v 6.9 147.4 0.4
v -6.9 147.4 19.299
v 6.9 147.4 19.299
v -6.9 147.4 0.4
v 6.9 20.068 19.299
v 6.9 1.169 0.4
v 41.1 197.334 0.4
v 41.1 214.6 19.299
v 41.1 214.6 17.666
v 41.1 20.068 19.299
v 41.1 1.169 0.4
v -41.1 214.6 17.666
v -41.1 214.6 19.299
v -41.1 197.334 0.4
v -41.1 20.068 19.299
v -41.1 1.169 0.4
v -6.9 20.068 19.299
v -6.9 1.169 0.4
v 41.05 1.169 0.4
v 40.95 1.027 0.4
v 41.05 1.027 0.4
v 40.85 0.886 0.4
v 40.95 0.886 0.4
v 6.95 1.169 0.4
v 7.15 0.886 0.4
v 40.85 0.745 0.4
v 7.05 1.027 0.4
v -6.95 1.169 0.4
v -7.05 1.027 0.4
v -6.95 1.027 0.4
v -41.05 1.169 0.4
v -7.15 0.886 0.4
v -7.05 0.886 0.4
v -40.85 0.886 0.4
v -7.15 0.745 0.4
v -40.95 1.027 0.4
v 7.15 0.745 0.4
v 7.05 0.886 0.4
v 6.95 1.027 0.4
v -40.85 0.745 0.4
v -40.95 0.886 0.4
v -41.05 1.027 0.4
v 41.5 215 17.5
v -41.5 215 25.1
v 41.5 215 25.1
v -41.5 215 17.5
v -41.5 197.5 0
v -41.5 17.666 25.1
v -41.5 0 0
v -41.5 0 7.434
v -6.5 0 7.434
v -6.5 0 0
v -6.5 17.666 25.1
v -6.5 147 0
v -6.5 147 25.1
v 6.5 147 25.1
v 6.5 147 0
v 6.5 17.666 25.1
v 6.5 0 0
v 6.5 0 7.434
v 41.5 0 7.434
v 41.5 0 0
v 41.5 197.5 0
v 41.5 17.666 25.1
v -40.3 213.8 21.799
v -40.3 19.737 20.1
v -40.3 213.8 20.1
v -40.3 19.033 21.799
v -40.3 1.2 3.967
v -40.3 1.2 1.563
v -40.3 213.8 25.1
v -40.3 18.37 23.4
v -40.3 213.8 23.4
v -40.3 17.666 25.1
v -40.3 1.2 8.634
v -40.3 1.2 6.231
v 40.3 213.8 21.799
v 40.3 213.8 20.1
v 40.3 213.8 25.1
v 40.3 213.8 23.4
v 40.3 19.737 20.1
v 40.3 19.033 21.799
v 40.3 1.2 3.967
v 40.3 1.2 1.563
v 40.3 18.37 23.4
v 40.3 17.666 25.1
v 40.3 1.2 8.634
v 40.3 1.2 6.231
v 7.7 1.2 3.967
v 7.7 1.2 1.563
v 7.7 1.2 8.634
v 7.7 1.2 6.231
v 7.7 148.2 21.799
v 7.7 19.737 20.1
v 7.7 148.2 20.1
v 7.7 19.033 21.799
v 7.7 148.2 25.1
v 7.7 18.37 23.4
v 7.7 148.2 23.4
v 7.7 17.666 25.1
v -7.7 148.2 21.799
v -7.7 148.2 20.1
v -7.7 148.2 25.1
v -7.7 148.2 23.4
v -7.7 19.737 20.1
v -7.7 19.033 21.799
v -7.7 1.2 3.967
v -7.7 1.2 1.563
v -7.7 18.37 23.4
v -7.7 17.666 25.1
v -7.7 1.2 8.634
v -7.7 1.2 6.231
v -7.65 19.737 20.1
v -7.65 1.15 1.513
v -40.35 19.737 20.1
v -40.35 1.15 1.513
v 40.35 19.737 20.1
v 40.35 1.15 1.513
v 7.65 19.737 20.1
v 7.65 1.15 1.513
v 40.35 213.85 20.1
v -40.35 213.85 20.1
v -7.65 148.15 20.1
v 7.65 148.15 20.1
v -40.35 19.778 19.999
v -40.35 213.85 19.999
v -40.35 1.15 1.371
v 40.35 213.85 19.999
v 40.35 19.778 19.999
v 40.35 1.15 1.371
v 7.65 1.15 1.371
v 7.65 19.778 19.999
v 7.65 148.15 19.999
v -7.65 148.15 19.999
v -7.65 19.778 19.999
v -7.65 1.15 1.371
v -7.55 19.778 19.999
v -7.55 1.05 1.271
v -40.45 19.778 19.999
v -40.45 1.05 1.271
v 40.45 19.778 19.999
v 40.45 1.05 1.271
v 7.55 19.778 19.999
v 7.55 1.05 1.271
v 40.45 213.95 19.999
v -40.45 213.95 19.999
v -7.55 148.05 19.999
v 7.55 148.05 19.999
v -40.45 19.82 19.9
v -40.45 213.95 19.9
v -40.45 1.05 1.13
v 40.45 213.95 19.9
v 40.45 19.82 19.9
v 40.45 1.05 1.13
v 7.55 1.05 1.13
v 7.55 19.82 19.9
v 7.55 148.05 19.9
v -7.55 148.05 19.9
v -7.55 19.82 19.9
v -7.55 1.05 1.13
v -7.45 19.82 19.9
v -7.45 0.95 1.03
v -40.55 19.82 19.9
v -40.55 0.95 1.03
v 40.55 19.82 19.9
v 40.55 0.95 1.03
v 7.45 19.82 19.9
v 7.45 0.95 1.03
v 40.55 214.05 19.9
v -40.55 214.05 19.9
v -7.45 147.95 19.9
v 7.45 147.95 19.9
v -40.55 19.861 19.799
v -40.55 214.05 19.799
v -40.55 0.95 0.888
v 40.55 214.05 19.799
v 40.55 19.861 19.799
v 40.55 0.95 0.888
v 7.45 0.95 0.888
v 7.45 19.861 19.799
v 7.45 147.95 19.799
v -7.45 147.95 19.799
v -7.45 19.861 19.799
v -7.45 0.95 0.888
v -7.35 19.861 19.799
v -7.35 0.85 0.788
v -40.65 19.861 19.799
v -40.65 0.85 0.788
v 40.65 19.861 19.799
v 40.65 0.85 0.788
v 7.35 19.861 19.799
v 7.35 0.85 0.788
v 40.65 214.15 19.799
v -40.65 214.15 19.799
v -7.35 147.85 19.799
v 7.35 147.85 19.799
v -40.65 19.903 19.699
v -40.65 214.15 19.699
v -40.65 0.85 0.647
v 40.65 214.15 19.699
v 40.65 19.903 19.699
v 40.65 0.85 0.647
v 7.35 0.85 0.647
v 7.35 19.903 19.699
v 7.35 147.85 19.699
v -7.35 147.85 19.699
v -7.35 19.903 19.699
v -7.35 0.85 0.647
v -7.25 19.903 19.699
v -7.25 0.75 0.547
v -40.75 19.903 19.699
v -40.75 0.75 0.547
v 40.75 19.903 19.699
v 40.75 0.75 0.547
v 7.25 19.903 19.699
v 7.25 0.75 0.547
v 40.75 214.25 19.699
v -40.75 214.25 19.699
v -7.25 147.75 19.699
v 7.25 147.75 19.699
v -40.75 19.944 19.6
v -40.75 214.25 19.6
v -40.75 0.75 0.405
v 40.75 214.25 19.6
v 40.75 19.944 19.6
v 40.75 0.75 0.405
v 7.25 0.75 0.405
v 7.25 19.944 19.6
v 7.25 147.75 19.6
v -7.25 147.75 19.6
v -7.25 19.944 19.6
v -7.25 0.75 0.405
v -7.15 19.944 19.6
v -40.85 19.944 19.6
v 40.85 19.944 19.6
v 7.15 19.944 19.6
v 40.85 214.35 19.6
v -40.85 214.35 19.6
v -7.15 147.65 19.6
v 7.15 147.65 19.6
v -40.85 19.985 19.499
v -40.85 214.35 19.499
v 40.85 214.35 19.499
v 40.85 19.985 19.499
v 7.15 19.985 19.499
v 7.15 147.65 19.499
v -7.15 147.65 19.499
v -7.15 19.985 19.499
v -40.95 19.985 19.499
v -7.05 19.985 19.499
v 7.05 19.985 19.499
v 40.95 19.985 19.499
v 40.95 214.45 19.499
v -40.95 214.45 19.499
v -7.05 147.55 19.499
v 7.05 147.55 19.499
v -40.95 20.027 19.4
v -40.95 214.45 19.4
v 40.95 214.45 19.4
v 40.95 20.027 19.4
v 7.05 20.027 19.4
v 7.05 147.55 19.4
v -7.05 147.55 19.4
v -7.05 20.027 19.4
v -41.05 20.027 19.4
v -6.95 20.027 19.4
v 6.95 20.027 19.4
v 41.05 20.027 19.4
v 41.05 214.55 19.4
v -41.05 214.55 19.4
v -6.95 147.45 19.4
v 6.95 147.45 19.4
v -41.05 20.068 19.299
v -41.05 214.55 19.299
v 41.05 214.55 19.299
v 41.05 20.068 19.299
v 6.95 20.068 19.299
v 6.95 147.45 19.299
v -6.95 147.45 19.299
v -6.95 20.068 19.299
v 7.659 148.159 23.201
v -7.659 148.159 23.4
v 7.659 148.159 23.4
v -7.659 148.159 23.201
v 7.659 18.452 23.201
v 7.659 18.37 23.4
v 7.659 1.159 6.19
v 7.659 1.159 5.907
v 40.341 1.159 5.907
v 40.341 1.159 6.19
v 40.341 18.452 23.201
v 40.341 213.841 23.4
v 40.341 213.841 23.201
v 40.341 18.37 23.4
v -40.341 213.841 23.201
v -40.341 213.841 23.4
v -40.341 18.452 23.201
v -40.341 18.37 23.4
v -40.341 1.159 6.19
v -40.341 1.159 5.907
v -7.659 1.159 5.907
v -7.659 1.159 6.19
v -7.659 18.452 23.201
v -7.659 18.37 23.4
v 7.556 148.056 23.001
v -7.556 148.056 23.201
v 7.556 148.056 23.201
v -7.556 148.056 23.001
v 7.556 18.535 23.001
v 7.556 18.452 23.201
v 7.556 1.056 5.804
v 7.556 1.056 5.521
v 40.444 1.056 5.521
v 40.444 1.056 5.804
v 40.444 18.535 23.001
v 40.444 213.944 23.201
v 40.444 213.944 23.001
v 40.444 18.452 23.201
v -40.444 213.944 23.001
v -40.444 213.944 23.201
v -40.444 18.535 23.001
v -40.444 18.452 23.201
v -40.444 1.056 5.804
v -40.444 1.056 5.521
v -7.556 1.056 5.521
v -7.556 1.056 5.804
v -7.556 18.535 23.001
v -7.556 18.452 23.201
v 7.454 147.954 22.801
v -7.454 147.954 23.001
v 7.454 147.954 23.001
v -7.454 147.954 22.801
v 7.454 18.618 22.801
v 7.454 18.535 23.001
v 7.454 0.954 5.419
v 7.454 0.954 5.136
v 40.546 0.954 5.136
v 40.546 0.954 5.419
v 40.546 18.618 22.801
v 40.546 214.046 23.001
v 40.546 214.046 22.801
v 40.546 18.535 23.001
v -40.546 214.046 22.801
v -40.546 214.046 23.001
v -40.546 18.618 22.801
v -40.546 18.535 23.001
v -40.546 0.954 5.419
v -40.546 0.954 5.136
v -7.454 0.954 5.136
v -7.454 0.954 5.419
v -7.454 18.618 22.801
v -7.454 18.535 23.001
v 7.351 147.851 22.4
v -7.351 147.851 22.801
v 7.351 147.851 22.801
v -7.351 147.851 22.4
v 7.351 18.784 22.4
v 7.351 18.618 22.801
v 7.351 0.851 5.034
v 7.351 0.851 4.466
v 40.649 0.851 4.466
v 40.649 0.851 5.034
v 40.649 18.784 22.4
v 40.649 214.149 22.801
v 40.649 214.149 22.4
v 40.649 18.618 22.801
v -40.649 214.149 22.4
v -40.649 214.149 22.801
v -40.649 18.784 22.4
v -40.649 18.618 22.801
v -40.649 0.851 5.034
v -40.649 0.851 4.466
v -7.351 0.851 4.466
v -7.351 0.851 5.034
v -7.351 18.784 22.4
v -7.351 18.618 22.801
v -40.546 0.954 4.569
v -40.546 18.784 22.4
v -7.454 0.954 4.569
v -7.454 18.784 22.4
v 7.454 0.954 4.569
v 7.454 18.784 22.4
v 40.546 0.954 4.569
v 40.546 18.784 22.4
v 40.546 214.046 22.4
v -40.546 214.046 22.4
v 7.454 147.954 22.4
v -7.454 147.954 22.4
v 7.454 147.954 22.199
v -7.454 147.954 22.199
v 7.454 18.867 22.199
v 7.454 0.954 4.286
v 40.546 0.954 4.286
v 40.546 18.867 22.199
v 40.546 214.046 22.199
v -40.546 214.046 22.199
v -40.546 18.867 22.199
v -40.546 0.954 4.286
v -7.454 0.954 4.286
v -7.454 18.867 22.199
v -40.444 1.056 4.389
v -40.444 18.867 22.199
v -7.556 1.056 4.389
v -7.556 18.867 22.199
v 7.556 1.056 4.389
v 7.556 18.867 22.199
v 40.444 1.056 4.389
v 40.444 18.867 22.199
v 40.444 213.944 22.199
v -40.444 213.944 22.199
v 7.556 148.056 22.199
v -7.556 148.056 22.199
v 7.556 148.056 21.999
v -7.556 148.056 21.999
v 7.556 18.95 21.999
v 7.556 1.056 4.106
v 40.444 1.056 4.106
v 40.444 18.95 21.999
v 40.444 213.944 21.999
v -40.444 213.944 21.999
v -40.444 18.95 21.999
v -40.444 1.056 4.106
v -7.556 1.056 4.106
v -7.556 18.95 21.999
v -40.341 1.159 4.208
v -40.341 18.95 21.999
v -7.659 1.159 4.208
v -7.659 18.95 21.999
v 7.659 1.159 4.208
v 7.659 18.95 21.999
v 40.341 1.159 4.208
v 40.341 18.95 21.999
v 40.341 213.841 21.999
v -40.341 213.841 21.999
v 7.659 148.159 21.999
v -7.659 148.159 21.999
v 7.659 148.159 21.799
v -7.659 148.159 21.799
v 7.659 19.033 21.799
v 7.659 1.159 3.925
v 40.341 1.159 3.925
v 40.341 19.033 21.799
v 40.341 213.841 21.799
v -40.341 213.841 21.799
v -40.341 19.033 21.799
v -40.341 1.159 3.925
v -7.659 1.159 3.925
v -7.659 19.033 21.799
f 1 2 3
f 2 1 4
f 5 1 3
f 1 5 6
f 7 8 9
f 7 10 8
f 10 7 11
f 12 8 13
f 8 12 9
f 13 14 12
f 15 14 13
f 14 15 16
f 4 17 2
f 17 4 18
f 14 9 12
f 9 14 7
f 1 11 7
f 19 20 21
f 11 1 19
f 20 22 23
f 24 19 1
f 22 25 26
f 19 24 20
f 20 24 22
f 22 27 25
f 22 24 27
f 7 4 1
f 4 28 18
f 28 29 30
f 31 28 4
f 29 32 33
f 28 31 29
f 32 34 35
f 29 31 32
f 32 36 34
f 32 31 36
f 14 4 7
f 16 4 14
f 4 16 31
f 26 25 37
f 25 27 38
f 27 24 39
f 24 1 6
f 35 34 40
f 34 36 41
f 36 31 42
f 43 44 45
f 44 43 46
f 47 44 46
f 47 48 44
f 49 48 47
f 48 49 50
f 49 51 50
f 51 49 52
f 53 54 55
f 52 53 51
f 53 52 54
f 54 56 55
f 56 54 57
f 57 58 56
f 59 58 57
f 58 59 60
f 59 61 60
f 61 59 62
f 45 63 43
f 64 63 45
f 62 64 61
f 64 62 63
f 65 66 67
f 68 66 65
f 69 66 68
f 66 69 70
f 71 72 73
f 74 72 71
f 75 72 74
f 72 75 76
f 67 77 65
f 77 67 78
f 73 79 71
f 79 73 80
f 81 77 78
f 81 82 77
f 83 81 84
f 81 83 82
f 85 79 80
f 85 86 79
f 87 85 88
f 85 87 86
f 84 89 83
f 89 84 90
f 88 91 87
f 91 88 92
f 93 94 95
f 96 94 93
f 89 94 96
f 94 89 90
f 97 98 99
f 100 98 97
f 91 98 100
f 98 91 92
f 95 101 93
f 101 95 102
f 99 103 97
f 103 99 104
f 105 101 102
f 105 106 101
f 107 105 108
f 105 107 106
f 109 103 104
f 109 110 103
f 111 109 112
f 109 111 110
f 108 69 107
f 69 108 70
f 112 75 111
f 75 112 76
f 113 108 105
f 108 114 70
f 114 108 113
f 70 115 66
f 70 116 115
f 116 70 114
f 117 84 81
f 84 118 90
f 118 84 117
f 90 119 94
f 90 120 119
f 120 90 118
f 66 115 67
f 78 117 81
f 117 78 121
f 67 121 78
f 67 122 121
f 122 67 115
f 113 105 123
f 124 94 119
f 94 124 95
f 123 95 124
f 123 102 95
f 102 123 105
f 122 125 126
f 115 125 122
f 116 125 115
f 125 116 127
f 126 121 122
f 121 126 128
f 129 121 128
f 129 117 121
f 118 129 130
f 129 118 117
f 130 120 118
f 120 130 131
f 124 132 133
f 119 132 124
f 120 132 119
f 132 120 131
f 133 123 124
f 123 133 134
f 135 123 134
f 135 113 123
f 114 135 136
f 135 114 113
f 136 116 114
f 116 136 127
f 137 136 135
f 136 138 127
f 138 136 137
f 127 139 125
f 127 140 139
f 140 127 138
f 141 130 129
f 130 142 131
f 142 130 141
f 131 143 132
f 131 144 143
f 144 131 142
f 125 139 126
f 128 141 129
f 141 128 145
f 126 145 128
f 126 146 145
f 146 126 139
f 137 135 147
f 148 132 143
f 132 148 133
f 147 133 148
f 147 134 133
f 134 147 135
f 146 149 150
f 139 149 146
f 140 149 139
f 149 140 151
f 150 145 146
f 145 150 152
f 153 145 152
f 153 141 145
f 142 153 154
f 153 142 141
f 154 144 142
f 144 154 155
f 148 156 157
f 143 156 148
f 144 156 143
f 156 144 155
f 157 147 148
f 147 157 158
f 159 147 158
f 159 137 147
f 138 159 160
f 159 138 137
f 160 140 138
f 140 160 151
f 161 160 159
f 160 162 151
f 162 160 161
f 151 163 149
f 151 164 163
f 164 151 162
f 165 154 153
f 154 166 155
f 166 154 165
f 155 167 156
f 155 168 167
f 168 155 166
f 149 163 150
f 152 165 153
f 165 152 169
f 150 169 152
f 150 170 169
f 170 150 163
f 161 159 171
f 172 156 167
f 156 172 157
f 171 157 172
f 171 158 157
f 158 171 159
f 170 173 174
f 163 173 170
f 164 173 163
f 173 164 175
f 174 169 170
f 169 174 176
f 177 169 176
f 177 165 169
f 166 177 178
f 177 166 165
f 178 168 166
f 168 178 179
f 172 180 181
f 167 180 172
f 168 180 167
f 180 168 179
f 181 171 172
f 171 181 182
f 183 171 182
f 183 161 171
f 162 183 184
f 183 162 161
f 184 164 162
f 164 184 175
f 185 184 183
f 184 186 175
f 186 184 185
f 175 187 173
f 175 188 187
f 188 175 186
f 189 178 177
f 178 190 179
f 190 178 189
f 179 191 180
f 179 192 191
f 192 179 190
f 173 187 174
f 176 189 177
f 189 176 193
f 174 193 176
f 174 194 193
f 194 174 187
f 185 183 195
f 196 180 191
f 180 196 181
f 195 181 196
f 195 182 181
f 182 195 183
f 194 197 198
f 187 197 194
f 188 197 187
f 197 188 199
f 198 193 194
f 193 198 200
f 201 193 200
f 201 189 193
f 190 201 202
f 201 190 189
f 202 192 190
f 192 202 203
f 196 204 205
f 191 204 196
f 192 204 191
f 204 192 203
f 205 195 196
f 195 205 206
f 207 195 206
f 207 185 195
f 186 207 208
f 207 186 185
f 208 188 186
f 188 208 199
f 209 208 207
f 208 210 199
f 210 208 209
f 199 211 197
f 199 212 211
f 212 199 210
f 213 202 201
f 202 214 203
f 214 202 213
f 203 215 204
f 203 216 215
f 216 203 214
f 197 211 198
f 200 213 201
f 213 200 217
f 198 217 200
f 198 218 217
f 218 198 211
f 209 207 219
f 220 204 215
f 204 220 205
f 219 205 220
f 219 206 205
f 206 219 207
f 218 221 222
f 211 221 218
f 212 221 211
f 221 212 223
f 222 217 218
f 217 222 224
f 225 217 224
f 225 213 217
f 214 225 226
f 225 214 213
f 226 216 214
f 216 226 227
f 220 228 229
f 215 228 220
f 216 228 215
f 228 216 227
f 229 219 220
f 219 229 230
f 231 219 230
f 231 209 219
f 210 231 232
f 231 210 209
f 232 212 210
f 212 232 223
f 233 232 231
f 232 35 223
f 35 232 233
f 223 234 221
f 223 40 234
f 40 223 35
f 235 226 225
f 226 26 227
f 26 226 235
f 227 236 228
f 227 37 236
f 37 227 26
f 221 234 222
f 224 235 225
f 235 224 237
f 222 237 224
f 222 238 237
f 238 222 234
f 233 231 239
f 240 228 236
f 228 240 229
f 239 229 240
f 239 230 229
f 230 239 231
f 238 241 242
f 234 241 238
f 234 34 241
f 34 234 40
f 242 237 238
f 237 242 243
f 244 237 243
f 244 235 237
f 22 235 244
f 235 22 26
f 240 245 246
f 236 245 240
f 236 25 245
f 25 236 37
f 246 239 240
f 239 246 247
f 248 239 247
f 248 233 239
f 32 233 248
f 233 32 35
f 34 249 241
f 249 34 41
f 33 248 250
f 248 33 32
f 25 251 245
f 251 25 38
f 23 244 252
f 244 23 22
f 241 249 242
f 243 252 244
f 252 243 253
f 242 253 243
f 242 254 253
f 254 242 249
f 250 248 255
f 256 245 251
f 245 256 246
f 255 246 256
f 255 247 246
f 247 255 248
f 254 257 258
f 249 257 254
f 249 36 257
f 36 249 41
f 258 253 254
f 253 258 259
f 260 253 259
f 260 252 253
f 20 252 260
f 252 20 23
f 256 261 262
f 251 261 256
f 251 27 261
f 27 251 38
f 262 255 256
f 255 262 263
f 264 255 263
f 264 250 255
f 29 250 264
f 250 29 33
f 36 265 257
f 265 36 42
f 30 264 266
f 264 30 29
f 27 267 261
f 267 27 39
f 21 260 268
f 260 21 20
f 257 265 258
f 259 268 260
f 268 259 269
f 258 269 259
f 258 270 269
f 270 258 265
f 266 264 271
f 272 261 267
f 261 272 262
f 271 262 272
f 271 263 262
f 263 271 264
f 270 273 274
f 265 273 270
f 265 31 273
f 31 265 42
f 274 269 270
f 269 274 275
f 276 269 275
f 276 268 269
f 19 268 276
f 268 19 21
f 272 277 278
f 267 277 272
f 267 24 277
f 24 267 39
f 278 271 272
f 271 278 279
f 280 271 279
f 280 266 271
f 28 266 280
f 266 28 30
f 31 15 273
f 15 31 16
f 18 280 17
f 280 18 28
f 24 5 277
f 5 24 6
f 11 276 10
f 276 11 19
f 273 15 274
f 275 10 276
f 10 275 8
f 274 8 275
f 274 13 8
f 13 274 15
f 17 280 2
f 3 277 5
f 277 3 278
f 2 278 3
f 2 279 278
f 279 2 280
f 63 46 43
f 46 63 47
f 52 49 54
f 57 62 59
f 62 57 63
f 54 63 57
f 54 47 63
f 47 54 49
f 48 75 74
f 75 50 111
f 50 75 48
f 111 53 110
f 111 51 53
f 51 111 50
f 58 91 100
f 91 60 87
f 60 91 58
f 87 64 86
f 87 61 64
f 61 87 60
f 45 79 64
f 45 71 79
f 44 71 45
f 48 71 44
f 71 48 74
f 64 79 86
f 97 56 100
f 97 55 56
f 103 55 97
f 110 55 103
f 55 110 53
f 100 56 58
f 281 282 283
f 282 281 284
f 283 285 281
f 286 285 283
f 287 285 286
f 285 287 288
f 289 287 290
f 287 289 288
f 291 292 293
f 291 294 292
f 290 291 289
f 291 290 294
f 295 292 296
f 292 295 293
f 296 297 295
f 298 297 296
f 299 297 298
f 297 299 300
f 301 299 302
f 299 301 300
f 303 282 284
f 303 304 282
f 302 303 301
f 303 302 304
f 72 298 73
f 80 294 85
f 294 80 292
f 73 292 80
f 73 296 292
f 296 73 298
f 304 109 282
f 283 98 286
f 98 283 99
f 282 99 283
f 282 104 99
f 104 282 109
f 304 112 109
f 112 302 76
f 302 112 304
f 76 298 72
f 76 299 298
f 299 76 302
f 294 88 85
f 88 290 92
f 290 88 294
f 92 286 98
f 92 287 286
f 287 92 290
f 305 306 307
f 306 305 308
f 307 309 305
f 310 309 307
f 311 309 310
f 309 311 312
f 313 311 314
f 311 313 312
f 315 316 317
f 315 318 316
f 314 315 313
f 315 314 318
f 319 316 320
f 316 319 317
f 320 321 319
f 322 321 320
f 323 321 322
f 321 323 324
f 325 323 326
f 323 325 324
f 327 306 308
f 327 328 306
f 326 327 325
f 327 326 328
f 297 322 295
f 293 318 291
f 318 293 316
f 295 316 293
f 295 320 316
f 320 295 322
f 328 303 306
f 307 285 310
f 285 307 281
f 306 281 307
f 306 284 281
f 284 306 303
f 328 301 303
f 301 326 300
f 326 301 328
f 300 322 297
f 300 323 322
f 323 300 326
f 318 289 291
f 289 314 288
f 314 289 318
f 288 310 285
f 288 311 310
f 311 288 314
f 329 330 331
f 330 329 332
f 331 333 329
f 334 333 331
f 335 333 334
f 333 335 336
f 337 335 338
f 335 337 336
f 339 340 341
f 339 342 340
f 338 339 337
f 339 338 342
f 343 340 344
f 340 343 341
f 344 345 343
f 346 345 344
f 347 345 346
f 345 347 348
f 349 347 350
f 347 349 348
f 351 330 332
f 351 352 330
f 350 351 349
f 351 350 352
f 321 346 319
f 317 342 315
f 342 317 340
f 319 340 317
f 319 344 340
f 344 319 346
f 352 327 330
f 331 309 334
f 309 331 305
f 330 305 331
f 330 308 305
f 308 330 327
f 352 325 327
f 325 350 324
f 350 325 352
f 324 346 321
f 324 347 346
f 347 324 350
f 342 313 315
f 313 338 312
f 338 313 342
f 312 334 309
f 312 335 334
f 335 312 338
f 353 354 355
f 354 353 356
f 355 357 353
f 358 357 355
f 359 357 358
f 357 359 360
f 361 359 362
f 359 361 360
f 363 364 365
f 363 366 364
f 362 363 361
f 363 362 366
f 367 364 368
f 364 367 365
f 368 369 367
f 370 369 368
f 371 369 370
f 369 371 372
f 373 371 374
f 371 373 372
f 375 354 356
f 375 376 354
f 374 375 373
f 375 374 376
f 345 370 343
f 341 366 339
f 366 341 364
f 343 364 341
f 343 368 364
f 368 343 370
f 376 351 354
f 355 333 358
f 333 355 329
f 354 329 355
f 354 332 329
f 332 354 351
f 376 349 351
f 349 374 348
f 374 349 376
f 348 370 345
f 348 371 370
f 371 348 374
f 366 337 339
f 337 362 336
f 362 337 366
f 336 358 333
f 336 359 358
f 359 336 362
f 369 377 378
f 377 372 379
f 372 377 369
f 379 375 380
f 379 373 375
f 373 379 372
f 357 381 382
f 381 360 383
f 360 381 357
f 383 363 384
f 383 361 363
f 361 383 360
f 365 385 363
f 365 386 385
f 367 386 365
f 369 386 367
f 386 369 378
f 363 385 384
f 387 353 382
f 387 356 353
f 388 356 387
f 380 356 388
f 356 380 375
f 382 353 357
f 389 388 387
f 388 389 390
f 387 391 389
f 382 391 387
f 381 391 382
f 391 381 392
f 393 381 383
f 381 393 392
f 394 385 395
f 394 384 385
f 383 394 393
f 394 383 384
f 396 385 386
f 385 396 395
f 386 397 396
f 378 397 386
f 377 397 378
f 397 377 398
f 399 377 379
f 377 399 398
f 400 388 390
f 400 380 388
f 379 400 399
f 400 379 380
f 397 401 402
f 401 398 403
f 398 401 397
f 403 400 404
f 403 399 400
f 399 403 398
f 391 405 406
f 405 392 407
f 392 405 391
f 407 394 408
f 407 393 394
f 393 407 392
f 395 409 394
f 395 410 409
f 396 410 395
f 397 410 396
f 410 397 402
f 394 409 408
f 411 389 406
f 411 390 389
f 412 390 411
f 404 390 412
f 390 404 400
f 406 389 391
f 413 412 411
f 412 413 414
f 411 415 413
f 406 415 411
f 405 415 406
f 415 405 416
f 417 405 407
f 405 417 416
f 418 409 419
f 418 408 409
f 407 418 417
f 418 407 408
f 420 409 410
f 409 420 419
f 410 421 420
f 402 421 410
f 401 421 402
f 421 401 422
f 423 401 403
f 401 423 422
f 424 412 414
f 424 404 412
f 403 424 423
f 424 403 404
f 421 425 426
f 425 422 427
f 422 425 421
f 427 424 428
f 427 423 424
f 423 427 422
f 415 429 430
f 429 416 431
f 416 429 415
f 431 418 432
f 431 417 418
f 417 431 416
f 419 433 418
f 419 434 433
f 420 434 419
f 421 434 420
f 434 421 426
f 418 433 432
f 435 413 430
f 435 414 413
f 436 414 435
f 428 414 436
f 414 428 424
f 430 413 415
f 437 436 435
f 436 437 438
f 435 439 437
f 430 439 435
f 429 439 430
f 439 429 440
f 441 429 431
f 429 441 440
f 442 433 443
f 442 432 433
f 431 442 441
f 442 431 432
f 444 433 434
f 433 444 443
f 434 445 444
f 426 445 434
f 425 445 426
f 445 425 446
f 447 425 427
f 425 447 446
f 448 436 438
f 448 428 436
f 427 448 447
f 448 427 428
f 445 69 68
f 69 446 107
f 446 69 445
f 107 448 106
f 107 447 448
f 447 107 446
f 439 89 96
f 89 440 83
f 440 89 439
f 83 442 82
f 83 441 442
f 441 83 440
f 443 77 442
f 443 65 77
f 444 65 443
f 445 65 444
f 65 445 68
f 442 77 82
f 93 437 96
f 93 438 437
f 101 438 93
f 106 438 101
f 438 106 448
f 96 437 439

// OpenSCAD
// file: ../../lib/util.scad
// ==========================================================================
//  Turtle Body -- shared helper modules and functions
// --------------------------------------------------------------------------
//  Small pieces that were copy-pasted across the standalone files. Geometry
//  lives in the per-subsystem lib/ modules; this file is only glue.
//
//  Definitions only -- no top-level geometry, no top-level assignments.
// ==========================================================================

use <params.scad>

// Colour wrapper for wooden parts. When colour coding is off, every wooden
// component renders in one neutral wood tone; bottles, hardware, sails and
// printed parts keep their own colours and never call this.
module wood_color(coded_color, enabled = true, neutral = [0.94, 0.83, 0.62]) {
    color(enabled ? coded_color : neutral) children();
}

// scalar clamp
function clamp(v, lo, hi) = v < lo ? lo : (v > hi ? hi : v);

// Visual-only M6 bolt: plain shaft + hex-less cylindrical head. No thread,
// no torque rating -- a placeholder for fit inspection.
//  Local Z=0 is the underside of the head; the shaft runs toward +Z from Z=0
//  (plus an optional tip_extension), the head sits at Z=-head_t..0. Matches
//  the standalone files.
module m6_bolt_placeholder(grip_length, tip_extension = 1,
                           shaft_d = undef, head_d = undef, head_t = undef,
                           color_rgb = [0.15, 0.15, 0.15], fn = 48) {
    sd = shaft_d == undef ? p_m6_bolt_shaft_d() : shaft_d;
    hd = head_d  == undef ? p_m6_bolt_head_d()  : head_d;
    ht = head_t  == undef ? p_m6_bolt_head_t()  : head_t;
    assert(grip_length > 0, "m6_bolt_placeholder: grip_length must be positive.");
    color(color_rgb)
        union() {
            cylinder(d = sd, h = grip_length + tip_extension, $fn = fn);
            translate([0, 0, -ht])
                cylinder(d = hd, h = ht, $fn = fn);
        }
}

// Regular hexagonal prism specified by across-flats width (OpenSCAD's
// cylinder($fn=6) is specified across corners, which is the usual trap).
module hex_prism_af(across_flats, h, center = false) {
    cylinder(d = across_flats / cos(30), h = h, $fn = 6, center = center);
}
// main file
/*
 Hope Turtle sand ballast container -- bottom (open tray). Units: mm. License: CERN-OHL-S-2.0.
 EXPERIMENTAL -- not built, filled or tested.
 A 3D-printed U-shaped box that slides into the gap between the bottom
 bottle's base and the ballast's orange bottom board, its two arms either
 side of the yellow ballast fin. Fill the tray with sand, click the lid on,
 slide it under the bottle. Walls 0.4 mm (one extrusion line).
 Print floor down (part="print", the default) -- no support.
 The matching lid is Sand_Ballast_Container_Lid.scad.

 SOURCE FILE — geometry lives in lib/sand_ballast.scad + lib/params.scad.
 The committed self-contained file is generated by build/build.py.
*/

/* [Display] */
part = "print"; // [print,closed]  -- print = this piece alone in its print pose; closed = tray + lid together

use <../../lib/sand_ballast.scad>

sand_ballast_echo();

if (part == "print") {
    sand_ballast_bottom_print();
} else if (part == "closed") {
    sand_ballast_closed();
} else {
    assert(false, str("Unknown part: ", part));
}
